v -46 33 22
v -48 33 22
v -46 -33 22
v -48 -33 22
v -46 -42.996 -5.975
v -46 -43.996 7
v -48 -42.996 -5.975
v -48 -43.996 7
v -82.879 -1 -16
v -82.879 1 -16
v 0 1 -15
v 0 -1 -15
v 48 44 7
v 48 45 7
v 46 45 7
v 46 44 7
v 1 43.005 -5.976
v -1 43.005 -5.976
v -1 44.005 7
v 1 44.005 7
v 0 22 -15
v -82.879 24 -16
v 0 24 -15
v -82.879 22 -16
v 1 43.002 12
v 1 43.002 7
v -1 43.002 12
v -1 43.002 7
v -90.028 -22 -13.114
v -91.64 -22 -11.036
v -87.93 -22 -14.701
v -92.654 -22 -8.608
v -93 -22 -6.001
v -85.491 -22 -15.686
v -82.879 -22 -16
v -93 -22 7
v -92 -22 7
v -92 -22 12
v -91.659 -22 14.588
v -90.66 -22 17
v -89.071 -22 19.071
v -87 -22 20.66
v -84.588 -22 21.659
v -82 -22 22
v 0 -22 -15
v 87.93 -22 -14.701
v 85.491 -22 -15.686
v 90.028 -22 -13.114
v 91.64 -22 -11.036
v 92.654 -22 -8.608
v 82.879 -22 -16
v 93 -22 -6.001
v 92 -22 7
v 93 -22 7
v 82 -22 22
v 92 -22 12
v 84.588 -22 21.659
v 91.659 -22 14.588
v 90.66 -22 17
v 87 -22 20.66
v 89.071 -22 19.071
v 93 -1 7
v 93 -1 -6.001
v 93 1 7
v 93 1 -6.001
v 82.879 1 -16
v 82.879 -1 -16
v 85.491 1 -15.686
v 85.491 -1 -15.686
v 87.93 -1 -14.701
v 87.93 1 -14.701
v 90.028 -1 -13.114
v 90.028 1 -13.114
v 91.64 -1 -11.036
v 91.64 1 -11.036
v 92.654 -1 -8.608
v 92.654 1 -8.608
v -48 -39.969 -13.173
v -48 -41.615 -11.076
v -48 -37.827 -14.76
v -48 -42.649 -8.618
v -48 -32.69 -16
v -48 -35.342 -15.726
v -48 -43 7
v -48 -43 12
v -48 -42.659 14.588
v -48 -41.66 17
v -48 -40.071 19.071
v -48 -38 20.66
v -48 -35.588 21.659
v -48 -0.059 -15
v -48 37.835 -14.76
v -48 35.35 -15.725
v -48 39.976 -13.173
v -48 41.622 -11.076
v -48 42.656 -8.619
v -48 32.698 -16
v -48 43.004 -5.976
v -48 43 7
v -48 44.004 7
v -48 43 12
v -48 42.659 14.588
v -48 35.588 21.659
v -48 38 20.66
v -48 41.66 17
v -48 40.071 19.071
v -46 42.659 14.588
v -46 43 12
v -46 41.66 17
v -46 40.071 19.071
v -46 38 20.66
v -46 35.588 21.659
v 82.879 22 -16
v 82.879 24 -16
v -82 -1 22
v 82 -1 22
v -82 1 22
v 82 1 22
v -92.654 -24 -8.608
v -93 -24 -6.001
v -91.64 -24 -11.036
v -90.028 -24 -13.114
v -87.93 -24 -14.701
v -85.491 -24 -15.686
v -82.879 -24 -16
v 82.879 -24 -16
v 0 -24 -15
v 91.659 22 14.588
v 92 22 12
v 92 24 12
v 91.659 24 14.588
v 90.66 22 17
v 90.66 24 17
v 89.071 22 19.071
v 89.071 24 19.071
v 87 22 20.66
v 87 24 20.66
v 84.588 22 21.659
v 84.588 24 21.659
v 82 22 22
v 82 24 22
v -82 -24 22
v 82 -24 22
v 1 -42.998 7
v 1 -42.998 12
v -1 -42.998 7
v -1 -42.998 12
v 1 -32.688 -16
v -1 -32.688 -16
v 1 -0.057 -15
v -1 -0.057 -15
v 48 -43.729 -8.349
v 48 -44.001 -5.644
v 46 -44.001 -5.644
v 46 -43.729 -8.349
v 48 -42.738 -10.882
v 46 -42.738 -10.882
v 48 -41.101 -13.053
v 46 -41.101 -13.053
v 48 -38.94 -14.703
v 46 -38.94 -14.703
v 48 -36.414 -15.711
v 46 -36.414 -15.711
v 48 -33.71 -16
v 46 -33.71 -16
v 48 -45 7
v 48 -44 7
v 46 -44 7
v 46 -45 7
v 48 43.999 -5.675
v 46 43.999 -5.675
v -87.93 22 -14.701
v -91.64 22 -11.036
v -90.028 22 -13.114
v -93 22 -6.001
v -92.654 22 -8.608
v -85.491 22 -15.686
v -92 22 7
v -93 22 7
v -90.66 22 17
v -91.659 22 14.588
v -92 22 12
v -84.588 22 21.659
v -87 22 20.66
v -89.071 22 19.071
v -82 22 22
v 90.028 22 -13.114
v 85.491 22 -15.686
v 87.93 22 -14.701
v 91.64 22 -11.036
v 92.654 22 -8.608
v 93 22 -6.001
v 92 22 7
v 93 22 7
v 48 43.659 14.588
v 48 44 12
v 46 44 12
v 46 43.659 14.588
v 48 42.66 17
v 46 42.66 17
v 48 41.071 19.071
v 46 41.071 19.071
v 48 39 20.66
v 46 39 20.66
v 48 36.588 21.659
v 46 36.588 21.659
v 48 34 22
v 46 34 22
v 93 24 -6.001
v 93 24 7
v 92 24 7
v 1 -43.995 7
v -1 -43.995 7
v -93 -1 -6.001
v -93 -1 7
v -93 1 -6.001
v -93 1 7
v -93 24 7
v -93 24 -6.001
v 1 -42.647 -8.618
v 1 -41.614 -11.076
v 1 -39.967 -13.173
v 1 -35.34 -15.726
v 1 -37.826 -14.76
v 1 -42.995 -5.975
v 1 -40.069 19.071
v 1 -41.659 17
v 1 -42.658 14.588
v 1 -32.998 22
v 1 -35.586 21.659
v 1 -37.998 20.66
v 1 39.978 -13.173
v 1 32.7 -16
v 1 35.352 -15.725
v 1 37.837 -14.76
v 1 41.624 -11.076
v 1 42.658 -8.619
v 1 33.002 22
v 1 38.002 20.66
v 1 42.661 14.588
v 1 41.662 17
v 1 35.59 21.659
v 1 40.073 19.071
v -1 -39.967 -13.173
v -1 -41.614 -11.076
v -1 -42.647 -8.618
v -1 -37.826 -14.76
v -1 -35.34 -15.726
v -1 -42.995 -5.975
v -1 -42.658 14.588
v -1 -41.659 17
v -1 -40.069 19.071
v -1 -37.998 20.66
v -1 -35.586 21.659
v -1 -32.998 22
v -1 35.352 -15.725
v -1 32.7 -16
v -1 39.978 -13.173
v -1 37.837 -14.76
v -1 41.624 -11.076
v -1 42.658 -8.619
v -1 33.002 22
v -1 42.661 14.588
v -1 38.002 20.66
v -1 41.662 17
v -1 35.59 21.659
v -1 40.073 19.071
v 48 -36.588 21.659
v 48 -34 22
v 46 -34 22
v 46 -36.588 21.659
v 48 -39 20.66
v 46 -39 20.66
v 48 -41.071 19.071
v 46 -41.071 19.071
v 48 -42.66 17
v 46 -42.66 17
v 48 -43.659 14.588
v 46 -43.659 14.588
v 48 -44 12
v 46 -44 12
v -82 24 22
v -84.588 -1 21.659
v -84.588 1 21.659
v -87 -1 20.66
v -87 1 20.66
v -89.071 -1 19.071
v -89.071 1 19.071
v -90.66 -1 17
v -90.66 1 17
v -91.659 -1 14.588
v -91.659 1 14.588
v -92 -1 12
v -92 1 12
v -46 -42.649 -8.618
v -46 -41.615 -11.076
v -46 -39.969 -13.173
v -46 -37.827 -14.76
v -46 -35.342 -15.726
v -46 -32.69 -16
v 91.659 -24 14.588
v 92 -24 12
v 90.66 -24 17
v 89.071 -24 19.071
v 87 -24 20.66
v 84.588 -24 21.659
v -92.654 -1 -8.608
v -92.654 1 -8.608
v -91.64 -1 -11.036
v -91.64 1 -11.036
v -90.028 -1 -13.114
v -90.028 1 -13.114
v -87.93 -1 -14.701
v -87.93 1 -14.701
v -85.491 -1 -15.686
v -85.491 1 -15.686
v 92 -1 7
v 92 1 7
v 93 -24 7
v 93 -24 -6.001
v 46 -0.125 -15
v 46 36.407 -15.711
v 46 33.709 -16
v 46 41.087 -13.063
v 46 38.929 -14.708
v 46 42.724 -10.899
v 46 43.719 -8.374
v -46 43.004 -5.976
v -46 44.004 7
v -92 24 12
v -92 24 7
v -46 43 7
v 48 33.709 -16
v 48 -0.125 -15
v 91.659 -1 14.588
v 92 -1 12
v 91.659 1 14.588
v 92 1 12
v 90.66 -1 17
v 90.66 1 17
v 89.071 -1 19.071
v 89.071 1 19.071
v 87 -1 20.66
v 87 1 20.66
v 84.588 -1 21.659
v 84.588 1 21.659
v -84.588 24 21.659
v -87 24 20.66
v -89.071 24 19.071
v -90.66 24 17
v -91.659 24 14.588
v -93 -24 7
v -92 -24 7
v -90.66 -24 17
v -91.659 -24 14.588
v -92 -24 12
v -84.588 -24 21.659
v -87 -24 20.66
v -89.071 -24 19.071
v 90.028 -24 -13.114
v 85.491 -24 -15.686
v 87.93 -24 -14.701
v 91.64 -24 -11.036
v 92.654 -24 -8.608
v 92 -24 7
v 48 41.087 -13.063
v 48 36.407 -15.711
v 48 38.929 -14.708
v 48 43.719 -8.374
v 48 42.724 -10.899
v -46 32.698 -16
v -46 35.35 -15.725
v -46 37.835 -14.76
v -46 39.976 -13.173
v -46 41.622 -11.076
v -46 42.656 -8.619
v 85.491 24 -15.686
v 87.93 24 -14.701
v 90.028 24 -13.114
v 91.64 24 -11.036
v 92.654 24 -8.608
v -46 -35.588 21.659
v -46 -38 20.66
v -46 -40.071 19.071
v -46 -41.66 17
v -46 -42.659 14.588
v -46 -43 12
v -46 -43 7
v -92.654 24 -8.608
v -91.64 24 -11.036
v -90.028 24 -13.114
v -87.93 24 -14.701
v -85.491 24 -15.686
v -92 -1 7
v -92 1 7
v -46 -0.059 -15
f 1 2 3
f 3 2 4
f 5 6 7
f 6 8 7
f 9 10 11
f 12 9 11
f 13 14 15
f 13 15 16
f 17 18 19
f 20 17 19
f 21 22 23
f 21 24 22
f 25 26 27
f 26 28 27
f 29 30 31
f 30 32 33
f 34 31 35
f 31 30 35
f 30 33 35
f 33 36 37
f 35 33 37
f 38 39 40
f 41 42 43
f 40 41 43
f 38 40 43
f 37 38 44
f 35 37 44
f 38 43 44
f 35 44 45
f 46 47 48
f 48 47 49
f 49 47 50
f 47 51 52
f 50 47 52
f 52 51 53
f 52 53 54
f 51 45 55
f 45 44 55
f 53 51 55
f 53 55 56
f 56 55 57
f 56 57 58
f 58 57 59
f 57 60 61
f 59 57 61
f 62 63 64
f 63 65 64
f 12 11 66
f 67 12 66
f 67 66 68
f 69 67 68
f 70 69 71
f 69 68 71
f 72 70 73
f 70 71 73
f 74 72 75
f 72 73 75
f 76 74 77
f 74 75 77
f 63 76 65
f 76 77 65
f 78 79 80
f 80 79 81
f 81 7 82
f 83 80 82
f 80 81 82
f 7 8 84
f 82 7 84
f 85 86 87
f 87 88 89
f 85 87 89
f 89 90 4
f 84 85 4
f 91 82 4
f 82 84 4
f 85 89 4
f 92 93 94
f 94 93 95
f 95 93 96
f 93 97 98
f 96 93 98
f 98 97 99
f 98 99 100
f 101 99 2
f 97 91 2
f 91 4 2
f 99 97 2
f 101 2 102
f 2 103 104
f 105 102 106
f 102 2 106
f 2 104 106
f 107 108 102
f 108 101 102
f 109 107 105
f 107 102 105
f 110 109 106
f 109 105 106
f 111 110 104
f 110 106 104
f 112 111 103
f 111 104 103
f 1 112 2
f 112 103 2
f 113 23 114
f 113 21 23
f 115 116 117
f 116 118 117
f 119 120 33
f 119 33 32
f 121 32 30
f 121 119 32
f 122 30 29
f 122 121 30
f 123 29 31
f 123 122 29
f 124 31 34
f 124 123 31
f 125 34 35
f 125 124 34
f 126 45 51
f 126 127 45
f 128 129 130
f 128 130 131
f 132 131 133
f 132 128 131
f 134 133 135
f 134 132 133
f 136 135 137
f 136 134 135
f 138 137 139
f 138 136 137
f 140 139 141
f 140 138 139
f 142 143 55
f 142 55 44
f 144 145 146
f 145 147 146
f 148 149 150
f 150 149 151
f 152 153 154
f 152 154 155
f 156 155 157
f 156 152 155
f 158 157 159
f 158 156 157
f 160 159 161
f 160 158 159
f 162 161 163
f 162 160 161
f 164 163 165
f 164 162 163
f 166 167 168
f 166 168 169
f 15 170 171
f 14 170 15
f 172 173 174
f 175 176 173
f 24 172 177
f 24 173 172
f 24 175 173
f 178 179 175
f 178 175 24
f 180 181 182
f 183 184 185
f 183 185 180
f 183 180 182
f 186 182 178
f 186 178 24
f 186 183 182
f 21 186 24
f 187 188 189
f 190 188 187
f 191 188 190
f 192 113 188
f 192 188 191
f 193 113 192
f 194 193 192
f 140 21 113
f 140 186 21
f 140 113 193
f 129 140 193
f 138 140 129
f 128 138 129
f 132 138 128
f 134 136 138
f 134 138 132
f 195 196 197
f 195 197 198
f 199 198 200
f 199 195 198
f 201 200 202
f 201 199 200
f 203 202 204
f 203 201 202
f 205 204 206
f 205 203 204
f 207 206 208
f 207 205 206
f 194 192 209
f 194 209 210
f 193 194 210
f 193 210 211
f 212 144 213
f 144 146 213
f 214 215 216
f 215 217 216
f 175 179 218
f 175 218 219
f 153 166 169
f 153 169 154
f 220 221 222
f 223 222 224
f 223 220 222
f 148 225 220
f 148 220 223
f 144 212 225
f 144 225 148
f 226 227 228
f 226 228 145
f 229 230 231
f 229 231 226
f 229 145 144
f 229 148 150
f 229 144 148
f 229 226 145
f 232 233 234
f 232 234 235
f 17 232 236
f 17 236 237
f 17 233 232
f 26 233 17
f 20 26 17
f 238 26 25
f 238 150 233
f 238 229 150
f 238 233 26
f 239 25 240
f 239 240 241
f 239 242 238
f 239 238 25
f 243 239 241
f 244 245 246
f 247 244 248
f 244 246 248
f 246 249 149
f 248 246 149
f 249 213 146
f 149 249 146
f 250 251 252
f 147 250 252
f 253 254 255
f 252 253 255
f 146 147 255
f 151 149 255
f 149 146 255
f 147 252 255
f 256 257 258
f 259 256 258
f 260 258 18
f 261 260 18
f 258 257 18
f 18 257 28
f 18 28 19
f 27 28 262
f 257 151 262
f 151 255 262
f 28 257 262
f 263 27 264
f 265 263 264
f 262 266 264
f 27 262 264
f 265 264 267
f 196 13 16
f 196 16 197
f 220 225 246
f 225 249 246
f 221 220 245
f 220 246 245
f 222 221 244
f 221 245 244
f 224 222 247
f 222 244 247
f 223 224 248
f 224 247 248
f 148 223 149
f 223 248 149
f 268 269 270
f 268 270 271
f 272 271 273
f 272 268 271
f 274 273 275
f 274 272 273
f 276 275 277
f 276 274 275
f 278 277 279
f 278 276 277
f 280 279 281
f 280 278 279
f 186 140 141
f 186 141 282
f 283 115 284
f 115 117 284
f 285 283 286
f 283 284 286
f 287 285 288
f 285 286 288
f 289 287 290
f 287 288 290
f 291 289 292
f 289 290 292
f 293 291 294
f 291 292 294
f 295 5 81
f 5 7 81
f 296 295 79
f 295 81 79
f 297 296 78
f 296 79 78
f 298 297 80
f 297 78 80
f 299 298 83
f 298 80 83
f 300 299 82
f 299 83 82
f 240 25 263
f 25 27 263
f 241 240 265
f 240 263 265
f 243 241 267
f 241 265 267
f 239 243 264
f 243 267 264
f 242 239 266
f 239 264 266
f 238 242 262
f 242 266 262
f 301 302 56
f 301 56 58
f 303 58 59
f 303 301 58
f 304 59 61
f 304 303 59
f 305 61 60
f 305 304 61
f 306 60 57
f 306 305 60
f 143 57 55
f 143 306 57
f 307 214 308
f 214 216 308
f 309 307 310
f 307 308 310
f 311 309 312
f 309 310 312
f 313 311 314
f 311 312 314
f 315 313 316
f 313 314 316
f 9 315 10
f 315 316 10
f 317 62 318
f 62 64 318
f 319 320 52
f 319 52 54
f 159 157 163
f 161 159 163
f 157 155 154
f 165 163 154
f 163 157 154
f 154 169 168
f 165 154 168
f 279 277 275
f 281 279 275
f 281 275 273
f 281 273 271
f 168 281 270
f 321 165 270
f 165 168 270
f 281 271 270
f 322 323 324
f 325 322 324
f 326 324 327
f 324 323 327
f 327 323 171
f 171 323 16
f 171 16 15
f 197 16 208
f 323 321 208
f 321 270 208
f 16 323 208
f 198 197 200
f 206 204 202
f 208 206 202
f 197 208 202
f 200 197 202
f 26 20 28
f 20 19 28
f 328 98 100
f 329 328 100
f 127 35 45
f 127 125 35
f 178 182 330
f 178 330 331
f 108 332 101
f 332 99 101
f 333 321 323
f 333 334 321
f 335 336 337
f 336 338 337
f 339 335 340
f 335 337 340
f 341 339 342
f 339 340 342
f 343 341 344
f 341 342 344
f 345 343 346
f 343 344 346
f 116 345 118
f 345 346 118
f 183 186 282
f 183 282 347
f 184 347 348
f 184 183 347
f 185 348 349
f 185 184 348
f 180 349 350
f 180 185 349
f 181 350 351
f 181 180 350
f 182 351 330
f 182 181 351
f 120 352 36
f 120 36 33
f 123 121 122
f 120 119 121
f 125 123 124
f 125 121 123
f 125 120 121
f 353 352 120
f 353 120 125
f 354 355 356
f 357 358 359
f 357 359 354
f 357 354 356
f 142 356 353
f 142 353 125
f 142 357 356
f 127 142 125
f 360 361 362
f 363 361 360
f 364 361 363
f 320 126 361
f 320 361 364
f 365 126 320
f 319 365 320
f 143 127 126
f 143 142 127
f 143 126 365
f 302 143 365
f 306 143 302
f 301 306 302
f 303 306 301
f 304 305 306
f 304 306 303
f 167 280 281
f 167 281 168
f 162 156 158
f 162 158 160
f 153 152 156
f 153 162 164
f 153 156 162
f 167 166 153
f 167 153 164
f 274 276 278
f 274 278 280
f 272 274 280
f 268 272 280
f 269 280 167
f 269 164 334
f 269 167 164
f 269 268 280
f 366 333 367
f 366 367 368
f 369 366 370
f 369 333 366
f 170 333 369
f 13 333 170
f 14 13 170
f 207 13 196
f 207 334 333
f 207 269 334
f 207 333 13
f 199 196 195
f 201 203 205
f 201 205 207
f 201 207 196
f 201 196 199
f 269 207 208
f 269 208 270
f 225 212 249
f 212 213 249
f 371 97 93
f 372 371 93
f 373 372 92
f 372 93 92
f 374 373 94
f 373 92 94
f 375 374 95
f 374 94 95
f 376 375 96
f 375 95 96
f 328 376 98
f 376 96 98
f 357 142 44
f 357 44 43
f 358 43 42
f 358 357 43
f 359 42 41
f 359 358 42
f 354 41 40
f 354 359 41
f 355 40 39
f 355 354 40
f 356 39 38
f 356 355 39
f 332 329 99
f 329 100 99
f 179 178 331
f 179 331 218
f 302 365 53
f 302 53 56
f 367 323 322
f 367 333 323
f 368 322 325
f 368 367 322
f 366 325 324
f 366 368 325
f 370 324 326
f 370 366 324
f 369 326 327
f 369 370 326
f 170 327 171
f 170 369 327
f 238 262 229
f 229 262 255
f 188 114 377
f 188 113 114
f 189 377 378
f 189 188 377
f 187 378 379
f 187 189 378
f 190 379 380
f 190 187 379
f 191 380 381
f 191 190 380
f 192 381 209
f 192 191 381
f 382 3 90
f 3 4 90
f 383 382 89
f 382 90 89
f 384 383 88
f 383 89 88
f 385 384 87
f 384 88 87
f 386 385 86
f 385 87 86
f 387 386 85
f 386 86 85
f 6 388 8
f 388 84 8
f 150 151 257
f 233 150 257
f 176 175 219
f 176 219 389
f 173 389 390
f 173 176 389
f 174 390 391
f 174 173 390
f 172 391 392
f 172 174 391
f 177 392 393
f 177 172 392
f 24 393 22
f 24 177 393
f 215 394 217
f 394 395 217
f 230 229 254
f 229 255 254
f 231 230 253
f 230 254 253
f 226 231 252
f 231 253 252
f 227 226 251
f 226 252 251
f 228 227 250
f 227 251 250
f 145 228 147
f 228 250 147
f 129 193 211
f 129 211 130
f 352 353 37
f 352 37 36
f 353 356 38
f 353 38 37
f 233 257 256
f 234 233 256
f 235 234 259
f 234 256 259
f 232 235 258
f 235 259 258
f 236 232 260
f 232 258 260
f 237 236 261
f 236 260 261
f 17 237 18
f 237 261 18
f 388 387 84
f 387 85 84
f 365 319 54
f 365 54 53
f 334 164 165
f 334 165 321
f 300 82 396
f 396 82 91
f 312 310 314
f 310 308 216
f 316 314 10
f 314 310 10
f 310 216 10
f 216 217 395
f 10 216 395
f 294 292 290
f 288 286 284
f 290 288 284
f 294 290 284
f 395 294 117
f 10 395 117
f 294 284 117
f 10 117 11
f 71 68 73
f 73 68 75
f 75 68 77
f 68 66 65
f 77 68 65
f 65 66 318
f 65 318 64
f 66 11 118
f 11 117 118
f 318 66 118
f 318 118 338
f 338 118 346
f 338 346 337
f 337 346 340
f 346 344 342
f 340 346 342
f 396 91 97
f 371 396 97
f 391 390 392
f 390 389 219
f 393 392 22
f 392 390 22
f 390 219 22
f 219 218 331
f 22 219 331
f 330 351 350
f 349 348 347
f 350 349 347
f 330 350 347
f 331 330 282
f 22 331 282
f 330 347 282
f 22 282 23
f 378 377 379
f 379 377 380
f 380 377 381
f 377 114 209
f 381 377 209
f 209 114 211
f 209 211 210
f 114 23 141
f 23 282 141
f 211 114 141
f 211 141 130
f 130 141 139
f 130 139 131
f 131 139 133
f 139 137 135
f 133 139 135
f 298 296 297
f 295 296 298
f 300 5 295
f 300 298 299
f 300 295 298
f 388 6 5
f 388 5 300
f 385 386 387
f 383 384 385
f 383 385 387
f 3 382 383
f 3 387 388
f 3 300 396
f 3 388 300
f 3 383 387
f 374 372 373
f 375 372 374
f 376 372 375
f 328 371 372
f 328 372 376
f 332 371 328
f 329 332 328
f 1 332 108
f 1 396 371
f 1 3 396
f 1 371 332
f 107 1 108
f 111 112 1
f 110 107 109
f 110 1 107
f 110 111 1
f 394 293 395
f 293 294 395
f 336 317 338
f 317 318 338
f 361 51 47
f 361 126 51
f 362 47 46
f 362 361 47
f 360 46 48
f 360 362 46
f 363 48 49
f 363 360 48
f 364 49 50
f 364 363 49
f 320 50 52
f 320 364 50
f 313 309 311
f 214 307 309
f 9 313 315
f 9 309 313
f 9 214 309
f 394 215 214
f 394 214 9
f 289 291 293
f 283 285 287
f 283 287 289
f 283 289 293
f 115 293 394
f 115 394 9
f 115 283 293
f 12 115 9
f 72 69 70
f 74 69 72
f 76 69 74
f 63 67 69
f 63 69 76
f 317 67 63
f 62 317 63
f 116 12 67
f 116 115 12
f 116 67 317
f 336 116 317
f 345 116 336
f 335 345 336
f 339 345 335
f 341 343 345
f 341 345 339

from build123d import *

# Parameters (mm, degrees)
F10_DEPTH = 1
F11_DEPTH = 1
F12_DEPTH = 1


with BuildPart() as f10:
    # F4 (on offset) → F10 (new body, symmetric)
    with BuildSketch(Plane.XZ.offset(23)):
        with BuildLine():
            ThreePointArc((82.879351, -16), (90.028283, -13.114323), (93, -6.000728))
            Line((93, -6.000728), (93, 7))
            Line((93, 7), (92, 7))
            Line((92, 7), (92, 12))
            ThreePointArc((92, 12), (89.071068, 19.071068), (82, 22))
            Line((82, 22), (-82, 22))
            ThreePointArc((-82, 22), (-89.071068, 19.071068), (-92, 12))
            Line((-92, 12), (-92, 7))
            Line((-92, 7), (-93, 7))
            Line((-93, 7), (-93, -6.000728))
            ThreePointArc((-93, -6.000728), (-90.028283, -13.114323), (-82.879351, -16))
            Line((-82.879351, -16), (0, -15))
            Line((0, -15), (82.879351, -16))
        make_face()
    extrude(amount=F10_DEPTH, both=True)


with BuildPart() as f11:
    # F5 (on Front) + F6 (on offset) → F11 (new body, symmetric)
    with BuildSketch(Plane.XZ):
        with BuildLine():
            ThreePointArc((82.879351, -16), (90.028283, -13.114323), (93, -6.000728))
            Line((93, -6.000728), (93, 7))
            Line((93, 7), (92, 7))
            Line((92, 7), (92, 12))
            ThreePointArc((92, 12), (89.071068, 19.071068), (82, 22))
            Line((82, 22), (-82, 22))
            ThreePointArc((-82, 22), (-89.071068, 19.071068), (-92, 12))
            Line((-92, 12), (-92, 7))
            Line((-92, 7), (-93, 7))
            Line((-93, 7), (-93, -6.000728))
            ThreePointArc((-93, -6.000728), (-90.028283, -13.114323), (-82.879351, -16))
            Line((-82.879351, -16), (0, -15))
            Line((0, -15), (82.879351, -16))
        make_face()
    with BuildSketch(Plane.XZ.offset(-23)):
        with BuildLine():
            ThreePointArc((82.879351, -16), (90.028283, -13.114323), (93, -6.000728))
            Line((93, -6.000728), (93, 7))
            Line((93, 7), (92, 7))
            Line((92, 7), (92, 12))
            ThreePointArc((92, 12), (89.071068, 19.071068), (82, 22))
            Line((82, 22), (-82, 22))
            ThreePointArc((-82, 22), (-89.071068, 19.071068), (-92, 12))
            Line((-92, 12), (-92, 7))
            Line((-92, 7), (-93, 7))
            Line((-93, 7), (-93, -6.000728))
            ThreePointArc((-93, -6.000728), (-90.028283, -13.114323), (-82.879351, -16))
            Line((-82.879351, -16), (0, -15))
            Line((0, -15), (82.879351, -16))
        make_face()
    extrude(amount=F11_DEPTH, both=True)


with BuildPart() as f12:
    # F8 (on offset) + F9 (on Right) + F7 (on offset) → F12 (new body, symmetric)
    with BuildSketch(Plane.YZ.offset(-47)):
        with BuildLine():
            Line((43.003591, -5.975801), (44.00363, 7))
            Line((44.00363, 7), (43, 7))
            Line((43, 7), (43, 12))
            ThreePointArc((43, 12), (40.071068, 19.071068), (33, 22))
            Line((33, 22), (-33, 22))
            ThreePointArc((-33, 22), (-40.071068, 19.071068), (-43, 12))
            Line((-43, 12), (-43, 7))
            Line((-43, 7), (-43.99637, 7))
            Line((-43.99637, 7), (-42.996409, -5.974798))
            ThreePointArc((-42.996409, -5.974798), (-39.969105, -13.172826), (-32.690144, -16))
            Line((-32.690144, -16), (-0.058741, -15))
            Line((-0.058741, -15), (32.698499, -16))
            ThreePointArc((32.698499, -16), (39.976333, -13.172742), (43.003591, -5.975801))
        make_face()
    with BuildSketch(Plane.YZ):
        with BuildLine():
            Line((43.005299, -5.975801), (44.005338, 7))
            Line((44.005338, 7), (43.001708, 7))
            Line((43.001708, 7), (43.001708, 12))
            ThreePointArc((43.001708, 12), (40.072776, 19.071068), (33.001708, 22))
            Line((33.001708, 22), (-32.998292, 22))
            ThreePointArc((-32.998292, 22), (-40.06936, 19.071068), (-42.998292, 12))
            Line((-42.998292, 12), (-42.998292, 7))
            Line((-42.998292, 7), (-43.994662, 7))
            Line((-43.994662, 7), (-42.994701, -5.974798))
            ThreePointArc((-42.994701, -5.974798), (-39.967396, -13.172826), (-32.688436, -16))
            Line((-32.688436, -16), (-0.057033, -15))
            Line((-0.057033, -15), (32.700207, -16))
            ThreePointArc((32.700207, -16), (39.978041, -13.172742), (43.005299, -5.975801))
        make_face()
    with BuildSketch(Plane.YZ.offset(47)):
        with BuildLine():
            Line((43.998771, -5.674747), (45, 7))
            Line((45, 7), (44, 7))
            Line((44, 7), (44, 12))
            ThreePointArc((44, 12), (41.071068, 19.071068), (34, 22))
            Line((34, 22), (-34, 22))
            ThreePointArc((-34, 22), (-41.071068, 19.071068), (-44, 12))
            Line((-44, 12), (-44, 7))
            Line((-44, 7), (-45, 7))
            Line((-45, 7), (-44.001229, -5.643621))
            ThreePointArc((-44.001229, -5.643621), (-41.101126, -13.05311), (-33.710121, -16))
            Line((-33.710121, -16), (-0.125082, -15))
            Line((-0.125082, -15), (33.708772, -16))
            ThreePointArc((33.708772, -16), (41.087354, -13.06333), (43.998771, -5.674747))
        make_face()
    extrude(amount=F12_DEPTH, both=True)


solid = Compound([f10.part, f11.part, f12.part])
